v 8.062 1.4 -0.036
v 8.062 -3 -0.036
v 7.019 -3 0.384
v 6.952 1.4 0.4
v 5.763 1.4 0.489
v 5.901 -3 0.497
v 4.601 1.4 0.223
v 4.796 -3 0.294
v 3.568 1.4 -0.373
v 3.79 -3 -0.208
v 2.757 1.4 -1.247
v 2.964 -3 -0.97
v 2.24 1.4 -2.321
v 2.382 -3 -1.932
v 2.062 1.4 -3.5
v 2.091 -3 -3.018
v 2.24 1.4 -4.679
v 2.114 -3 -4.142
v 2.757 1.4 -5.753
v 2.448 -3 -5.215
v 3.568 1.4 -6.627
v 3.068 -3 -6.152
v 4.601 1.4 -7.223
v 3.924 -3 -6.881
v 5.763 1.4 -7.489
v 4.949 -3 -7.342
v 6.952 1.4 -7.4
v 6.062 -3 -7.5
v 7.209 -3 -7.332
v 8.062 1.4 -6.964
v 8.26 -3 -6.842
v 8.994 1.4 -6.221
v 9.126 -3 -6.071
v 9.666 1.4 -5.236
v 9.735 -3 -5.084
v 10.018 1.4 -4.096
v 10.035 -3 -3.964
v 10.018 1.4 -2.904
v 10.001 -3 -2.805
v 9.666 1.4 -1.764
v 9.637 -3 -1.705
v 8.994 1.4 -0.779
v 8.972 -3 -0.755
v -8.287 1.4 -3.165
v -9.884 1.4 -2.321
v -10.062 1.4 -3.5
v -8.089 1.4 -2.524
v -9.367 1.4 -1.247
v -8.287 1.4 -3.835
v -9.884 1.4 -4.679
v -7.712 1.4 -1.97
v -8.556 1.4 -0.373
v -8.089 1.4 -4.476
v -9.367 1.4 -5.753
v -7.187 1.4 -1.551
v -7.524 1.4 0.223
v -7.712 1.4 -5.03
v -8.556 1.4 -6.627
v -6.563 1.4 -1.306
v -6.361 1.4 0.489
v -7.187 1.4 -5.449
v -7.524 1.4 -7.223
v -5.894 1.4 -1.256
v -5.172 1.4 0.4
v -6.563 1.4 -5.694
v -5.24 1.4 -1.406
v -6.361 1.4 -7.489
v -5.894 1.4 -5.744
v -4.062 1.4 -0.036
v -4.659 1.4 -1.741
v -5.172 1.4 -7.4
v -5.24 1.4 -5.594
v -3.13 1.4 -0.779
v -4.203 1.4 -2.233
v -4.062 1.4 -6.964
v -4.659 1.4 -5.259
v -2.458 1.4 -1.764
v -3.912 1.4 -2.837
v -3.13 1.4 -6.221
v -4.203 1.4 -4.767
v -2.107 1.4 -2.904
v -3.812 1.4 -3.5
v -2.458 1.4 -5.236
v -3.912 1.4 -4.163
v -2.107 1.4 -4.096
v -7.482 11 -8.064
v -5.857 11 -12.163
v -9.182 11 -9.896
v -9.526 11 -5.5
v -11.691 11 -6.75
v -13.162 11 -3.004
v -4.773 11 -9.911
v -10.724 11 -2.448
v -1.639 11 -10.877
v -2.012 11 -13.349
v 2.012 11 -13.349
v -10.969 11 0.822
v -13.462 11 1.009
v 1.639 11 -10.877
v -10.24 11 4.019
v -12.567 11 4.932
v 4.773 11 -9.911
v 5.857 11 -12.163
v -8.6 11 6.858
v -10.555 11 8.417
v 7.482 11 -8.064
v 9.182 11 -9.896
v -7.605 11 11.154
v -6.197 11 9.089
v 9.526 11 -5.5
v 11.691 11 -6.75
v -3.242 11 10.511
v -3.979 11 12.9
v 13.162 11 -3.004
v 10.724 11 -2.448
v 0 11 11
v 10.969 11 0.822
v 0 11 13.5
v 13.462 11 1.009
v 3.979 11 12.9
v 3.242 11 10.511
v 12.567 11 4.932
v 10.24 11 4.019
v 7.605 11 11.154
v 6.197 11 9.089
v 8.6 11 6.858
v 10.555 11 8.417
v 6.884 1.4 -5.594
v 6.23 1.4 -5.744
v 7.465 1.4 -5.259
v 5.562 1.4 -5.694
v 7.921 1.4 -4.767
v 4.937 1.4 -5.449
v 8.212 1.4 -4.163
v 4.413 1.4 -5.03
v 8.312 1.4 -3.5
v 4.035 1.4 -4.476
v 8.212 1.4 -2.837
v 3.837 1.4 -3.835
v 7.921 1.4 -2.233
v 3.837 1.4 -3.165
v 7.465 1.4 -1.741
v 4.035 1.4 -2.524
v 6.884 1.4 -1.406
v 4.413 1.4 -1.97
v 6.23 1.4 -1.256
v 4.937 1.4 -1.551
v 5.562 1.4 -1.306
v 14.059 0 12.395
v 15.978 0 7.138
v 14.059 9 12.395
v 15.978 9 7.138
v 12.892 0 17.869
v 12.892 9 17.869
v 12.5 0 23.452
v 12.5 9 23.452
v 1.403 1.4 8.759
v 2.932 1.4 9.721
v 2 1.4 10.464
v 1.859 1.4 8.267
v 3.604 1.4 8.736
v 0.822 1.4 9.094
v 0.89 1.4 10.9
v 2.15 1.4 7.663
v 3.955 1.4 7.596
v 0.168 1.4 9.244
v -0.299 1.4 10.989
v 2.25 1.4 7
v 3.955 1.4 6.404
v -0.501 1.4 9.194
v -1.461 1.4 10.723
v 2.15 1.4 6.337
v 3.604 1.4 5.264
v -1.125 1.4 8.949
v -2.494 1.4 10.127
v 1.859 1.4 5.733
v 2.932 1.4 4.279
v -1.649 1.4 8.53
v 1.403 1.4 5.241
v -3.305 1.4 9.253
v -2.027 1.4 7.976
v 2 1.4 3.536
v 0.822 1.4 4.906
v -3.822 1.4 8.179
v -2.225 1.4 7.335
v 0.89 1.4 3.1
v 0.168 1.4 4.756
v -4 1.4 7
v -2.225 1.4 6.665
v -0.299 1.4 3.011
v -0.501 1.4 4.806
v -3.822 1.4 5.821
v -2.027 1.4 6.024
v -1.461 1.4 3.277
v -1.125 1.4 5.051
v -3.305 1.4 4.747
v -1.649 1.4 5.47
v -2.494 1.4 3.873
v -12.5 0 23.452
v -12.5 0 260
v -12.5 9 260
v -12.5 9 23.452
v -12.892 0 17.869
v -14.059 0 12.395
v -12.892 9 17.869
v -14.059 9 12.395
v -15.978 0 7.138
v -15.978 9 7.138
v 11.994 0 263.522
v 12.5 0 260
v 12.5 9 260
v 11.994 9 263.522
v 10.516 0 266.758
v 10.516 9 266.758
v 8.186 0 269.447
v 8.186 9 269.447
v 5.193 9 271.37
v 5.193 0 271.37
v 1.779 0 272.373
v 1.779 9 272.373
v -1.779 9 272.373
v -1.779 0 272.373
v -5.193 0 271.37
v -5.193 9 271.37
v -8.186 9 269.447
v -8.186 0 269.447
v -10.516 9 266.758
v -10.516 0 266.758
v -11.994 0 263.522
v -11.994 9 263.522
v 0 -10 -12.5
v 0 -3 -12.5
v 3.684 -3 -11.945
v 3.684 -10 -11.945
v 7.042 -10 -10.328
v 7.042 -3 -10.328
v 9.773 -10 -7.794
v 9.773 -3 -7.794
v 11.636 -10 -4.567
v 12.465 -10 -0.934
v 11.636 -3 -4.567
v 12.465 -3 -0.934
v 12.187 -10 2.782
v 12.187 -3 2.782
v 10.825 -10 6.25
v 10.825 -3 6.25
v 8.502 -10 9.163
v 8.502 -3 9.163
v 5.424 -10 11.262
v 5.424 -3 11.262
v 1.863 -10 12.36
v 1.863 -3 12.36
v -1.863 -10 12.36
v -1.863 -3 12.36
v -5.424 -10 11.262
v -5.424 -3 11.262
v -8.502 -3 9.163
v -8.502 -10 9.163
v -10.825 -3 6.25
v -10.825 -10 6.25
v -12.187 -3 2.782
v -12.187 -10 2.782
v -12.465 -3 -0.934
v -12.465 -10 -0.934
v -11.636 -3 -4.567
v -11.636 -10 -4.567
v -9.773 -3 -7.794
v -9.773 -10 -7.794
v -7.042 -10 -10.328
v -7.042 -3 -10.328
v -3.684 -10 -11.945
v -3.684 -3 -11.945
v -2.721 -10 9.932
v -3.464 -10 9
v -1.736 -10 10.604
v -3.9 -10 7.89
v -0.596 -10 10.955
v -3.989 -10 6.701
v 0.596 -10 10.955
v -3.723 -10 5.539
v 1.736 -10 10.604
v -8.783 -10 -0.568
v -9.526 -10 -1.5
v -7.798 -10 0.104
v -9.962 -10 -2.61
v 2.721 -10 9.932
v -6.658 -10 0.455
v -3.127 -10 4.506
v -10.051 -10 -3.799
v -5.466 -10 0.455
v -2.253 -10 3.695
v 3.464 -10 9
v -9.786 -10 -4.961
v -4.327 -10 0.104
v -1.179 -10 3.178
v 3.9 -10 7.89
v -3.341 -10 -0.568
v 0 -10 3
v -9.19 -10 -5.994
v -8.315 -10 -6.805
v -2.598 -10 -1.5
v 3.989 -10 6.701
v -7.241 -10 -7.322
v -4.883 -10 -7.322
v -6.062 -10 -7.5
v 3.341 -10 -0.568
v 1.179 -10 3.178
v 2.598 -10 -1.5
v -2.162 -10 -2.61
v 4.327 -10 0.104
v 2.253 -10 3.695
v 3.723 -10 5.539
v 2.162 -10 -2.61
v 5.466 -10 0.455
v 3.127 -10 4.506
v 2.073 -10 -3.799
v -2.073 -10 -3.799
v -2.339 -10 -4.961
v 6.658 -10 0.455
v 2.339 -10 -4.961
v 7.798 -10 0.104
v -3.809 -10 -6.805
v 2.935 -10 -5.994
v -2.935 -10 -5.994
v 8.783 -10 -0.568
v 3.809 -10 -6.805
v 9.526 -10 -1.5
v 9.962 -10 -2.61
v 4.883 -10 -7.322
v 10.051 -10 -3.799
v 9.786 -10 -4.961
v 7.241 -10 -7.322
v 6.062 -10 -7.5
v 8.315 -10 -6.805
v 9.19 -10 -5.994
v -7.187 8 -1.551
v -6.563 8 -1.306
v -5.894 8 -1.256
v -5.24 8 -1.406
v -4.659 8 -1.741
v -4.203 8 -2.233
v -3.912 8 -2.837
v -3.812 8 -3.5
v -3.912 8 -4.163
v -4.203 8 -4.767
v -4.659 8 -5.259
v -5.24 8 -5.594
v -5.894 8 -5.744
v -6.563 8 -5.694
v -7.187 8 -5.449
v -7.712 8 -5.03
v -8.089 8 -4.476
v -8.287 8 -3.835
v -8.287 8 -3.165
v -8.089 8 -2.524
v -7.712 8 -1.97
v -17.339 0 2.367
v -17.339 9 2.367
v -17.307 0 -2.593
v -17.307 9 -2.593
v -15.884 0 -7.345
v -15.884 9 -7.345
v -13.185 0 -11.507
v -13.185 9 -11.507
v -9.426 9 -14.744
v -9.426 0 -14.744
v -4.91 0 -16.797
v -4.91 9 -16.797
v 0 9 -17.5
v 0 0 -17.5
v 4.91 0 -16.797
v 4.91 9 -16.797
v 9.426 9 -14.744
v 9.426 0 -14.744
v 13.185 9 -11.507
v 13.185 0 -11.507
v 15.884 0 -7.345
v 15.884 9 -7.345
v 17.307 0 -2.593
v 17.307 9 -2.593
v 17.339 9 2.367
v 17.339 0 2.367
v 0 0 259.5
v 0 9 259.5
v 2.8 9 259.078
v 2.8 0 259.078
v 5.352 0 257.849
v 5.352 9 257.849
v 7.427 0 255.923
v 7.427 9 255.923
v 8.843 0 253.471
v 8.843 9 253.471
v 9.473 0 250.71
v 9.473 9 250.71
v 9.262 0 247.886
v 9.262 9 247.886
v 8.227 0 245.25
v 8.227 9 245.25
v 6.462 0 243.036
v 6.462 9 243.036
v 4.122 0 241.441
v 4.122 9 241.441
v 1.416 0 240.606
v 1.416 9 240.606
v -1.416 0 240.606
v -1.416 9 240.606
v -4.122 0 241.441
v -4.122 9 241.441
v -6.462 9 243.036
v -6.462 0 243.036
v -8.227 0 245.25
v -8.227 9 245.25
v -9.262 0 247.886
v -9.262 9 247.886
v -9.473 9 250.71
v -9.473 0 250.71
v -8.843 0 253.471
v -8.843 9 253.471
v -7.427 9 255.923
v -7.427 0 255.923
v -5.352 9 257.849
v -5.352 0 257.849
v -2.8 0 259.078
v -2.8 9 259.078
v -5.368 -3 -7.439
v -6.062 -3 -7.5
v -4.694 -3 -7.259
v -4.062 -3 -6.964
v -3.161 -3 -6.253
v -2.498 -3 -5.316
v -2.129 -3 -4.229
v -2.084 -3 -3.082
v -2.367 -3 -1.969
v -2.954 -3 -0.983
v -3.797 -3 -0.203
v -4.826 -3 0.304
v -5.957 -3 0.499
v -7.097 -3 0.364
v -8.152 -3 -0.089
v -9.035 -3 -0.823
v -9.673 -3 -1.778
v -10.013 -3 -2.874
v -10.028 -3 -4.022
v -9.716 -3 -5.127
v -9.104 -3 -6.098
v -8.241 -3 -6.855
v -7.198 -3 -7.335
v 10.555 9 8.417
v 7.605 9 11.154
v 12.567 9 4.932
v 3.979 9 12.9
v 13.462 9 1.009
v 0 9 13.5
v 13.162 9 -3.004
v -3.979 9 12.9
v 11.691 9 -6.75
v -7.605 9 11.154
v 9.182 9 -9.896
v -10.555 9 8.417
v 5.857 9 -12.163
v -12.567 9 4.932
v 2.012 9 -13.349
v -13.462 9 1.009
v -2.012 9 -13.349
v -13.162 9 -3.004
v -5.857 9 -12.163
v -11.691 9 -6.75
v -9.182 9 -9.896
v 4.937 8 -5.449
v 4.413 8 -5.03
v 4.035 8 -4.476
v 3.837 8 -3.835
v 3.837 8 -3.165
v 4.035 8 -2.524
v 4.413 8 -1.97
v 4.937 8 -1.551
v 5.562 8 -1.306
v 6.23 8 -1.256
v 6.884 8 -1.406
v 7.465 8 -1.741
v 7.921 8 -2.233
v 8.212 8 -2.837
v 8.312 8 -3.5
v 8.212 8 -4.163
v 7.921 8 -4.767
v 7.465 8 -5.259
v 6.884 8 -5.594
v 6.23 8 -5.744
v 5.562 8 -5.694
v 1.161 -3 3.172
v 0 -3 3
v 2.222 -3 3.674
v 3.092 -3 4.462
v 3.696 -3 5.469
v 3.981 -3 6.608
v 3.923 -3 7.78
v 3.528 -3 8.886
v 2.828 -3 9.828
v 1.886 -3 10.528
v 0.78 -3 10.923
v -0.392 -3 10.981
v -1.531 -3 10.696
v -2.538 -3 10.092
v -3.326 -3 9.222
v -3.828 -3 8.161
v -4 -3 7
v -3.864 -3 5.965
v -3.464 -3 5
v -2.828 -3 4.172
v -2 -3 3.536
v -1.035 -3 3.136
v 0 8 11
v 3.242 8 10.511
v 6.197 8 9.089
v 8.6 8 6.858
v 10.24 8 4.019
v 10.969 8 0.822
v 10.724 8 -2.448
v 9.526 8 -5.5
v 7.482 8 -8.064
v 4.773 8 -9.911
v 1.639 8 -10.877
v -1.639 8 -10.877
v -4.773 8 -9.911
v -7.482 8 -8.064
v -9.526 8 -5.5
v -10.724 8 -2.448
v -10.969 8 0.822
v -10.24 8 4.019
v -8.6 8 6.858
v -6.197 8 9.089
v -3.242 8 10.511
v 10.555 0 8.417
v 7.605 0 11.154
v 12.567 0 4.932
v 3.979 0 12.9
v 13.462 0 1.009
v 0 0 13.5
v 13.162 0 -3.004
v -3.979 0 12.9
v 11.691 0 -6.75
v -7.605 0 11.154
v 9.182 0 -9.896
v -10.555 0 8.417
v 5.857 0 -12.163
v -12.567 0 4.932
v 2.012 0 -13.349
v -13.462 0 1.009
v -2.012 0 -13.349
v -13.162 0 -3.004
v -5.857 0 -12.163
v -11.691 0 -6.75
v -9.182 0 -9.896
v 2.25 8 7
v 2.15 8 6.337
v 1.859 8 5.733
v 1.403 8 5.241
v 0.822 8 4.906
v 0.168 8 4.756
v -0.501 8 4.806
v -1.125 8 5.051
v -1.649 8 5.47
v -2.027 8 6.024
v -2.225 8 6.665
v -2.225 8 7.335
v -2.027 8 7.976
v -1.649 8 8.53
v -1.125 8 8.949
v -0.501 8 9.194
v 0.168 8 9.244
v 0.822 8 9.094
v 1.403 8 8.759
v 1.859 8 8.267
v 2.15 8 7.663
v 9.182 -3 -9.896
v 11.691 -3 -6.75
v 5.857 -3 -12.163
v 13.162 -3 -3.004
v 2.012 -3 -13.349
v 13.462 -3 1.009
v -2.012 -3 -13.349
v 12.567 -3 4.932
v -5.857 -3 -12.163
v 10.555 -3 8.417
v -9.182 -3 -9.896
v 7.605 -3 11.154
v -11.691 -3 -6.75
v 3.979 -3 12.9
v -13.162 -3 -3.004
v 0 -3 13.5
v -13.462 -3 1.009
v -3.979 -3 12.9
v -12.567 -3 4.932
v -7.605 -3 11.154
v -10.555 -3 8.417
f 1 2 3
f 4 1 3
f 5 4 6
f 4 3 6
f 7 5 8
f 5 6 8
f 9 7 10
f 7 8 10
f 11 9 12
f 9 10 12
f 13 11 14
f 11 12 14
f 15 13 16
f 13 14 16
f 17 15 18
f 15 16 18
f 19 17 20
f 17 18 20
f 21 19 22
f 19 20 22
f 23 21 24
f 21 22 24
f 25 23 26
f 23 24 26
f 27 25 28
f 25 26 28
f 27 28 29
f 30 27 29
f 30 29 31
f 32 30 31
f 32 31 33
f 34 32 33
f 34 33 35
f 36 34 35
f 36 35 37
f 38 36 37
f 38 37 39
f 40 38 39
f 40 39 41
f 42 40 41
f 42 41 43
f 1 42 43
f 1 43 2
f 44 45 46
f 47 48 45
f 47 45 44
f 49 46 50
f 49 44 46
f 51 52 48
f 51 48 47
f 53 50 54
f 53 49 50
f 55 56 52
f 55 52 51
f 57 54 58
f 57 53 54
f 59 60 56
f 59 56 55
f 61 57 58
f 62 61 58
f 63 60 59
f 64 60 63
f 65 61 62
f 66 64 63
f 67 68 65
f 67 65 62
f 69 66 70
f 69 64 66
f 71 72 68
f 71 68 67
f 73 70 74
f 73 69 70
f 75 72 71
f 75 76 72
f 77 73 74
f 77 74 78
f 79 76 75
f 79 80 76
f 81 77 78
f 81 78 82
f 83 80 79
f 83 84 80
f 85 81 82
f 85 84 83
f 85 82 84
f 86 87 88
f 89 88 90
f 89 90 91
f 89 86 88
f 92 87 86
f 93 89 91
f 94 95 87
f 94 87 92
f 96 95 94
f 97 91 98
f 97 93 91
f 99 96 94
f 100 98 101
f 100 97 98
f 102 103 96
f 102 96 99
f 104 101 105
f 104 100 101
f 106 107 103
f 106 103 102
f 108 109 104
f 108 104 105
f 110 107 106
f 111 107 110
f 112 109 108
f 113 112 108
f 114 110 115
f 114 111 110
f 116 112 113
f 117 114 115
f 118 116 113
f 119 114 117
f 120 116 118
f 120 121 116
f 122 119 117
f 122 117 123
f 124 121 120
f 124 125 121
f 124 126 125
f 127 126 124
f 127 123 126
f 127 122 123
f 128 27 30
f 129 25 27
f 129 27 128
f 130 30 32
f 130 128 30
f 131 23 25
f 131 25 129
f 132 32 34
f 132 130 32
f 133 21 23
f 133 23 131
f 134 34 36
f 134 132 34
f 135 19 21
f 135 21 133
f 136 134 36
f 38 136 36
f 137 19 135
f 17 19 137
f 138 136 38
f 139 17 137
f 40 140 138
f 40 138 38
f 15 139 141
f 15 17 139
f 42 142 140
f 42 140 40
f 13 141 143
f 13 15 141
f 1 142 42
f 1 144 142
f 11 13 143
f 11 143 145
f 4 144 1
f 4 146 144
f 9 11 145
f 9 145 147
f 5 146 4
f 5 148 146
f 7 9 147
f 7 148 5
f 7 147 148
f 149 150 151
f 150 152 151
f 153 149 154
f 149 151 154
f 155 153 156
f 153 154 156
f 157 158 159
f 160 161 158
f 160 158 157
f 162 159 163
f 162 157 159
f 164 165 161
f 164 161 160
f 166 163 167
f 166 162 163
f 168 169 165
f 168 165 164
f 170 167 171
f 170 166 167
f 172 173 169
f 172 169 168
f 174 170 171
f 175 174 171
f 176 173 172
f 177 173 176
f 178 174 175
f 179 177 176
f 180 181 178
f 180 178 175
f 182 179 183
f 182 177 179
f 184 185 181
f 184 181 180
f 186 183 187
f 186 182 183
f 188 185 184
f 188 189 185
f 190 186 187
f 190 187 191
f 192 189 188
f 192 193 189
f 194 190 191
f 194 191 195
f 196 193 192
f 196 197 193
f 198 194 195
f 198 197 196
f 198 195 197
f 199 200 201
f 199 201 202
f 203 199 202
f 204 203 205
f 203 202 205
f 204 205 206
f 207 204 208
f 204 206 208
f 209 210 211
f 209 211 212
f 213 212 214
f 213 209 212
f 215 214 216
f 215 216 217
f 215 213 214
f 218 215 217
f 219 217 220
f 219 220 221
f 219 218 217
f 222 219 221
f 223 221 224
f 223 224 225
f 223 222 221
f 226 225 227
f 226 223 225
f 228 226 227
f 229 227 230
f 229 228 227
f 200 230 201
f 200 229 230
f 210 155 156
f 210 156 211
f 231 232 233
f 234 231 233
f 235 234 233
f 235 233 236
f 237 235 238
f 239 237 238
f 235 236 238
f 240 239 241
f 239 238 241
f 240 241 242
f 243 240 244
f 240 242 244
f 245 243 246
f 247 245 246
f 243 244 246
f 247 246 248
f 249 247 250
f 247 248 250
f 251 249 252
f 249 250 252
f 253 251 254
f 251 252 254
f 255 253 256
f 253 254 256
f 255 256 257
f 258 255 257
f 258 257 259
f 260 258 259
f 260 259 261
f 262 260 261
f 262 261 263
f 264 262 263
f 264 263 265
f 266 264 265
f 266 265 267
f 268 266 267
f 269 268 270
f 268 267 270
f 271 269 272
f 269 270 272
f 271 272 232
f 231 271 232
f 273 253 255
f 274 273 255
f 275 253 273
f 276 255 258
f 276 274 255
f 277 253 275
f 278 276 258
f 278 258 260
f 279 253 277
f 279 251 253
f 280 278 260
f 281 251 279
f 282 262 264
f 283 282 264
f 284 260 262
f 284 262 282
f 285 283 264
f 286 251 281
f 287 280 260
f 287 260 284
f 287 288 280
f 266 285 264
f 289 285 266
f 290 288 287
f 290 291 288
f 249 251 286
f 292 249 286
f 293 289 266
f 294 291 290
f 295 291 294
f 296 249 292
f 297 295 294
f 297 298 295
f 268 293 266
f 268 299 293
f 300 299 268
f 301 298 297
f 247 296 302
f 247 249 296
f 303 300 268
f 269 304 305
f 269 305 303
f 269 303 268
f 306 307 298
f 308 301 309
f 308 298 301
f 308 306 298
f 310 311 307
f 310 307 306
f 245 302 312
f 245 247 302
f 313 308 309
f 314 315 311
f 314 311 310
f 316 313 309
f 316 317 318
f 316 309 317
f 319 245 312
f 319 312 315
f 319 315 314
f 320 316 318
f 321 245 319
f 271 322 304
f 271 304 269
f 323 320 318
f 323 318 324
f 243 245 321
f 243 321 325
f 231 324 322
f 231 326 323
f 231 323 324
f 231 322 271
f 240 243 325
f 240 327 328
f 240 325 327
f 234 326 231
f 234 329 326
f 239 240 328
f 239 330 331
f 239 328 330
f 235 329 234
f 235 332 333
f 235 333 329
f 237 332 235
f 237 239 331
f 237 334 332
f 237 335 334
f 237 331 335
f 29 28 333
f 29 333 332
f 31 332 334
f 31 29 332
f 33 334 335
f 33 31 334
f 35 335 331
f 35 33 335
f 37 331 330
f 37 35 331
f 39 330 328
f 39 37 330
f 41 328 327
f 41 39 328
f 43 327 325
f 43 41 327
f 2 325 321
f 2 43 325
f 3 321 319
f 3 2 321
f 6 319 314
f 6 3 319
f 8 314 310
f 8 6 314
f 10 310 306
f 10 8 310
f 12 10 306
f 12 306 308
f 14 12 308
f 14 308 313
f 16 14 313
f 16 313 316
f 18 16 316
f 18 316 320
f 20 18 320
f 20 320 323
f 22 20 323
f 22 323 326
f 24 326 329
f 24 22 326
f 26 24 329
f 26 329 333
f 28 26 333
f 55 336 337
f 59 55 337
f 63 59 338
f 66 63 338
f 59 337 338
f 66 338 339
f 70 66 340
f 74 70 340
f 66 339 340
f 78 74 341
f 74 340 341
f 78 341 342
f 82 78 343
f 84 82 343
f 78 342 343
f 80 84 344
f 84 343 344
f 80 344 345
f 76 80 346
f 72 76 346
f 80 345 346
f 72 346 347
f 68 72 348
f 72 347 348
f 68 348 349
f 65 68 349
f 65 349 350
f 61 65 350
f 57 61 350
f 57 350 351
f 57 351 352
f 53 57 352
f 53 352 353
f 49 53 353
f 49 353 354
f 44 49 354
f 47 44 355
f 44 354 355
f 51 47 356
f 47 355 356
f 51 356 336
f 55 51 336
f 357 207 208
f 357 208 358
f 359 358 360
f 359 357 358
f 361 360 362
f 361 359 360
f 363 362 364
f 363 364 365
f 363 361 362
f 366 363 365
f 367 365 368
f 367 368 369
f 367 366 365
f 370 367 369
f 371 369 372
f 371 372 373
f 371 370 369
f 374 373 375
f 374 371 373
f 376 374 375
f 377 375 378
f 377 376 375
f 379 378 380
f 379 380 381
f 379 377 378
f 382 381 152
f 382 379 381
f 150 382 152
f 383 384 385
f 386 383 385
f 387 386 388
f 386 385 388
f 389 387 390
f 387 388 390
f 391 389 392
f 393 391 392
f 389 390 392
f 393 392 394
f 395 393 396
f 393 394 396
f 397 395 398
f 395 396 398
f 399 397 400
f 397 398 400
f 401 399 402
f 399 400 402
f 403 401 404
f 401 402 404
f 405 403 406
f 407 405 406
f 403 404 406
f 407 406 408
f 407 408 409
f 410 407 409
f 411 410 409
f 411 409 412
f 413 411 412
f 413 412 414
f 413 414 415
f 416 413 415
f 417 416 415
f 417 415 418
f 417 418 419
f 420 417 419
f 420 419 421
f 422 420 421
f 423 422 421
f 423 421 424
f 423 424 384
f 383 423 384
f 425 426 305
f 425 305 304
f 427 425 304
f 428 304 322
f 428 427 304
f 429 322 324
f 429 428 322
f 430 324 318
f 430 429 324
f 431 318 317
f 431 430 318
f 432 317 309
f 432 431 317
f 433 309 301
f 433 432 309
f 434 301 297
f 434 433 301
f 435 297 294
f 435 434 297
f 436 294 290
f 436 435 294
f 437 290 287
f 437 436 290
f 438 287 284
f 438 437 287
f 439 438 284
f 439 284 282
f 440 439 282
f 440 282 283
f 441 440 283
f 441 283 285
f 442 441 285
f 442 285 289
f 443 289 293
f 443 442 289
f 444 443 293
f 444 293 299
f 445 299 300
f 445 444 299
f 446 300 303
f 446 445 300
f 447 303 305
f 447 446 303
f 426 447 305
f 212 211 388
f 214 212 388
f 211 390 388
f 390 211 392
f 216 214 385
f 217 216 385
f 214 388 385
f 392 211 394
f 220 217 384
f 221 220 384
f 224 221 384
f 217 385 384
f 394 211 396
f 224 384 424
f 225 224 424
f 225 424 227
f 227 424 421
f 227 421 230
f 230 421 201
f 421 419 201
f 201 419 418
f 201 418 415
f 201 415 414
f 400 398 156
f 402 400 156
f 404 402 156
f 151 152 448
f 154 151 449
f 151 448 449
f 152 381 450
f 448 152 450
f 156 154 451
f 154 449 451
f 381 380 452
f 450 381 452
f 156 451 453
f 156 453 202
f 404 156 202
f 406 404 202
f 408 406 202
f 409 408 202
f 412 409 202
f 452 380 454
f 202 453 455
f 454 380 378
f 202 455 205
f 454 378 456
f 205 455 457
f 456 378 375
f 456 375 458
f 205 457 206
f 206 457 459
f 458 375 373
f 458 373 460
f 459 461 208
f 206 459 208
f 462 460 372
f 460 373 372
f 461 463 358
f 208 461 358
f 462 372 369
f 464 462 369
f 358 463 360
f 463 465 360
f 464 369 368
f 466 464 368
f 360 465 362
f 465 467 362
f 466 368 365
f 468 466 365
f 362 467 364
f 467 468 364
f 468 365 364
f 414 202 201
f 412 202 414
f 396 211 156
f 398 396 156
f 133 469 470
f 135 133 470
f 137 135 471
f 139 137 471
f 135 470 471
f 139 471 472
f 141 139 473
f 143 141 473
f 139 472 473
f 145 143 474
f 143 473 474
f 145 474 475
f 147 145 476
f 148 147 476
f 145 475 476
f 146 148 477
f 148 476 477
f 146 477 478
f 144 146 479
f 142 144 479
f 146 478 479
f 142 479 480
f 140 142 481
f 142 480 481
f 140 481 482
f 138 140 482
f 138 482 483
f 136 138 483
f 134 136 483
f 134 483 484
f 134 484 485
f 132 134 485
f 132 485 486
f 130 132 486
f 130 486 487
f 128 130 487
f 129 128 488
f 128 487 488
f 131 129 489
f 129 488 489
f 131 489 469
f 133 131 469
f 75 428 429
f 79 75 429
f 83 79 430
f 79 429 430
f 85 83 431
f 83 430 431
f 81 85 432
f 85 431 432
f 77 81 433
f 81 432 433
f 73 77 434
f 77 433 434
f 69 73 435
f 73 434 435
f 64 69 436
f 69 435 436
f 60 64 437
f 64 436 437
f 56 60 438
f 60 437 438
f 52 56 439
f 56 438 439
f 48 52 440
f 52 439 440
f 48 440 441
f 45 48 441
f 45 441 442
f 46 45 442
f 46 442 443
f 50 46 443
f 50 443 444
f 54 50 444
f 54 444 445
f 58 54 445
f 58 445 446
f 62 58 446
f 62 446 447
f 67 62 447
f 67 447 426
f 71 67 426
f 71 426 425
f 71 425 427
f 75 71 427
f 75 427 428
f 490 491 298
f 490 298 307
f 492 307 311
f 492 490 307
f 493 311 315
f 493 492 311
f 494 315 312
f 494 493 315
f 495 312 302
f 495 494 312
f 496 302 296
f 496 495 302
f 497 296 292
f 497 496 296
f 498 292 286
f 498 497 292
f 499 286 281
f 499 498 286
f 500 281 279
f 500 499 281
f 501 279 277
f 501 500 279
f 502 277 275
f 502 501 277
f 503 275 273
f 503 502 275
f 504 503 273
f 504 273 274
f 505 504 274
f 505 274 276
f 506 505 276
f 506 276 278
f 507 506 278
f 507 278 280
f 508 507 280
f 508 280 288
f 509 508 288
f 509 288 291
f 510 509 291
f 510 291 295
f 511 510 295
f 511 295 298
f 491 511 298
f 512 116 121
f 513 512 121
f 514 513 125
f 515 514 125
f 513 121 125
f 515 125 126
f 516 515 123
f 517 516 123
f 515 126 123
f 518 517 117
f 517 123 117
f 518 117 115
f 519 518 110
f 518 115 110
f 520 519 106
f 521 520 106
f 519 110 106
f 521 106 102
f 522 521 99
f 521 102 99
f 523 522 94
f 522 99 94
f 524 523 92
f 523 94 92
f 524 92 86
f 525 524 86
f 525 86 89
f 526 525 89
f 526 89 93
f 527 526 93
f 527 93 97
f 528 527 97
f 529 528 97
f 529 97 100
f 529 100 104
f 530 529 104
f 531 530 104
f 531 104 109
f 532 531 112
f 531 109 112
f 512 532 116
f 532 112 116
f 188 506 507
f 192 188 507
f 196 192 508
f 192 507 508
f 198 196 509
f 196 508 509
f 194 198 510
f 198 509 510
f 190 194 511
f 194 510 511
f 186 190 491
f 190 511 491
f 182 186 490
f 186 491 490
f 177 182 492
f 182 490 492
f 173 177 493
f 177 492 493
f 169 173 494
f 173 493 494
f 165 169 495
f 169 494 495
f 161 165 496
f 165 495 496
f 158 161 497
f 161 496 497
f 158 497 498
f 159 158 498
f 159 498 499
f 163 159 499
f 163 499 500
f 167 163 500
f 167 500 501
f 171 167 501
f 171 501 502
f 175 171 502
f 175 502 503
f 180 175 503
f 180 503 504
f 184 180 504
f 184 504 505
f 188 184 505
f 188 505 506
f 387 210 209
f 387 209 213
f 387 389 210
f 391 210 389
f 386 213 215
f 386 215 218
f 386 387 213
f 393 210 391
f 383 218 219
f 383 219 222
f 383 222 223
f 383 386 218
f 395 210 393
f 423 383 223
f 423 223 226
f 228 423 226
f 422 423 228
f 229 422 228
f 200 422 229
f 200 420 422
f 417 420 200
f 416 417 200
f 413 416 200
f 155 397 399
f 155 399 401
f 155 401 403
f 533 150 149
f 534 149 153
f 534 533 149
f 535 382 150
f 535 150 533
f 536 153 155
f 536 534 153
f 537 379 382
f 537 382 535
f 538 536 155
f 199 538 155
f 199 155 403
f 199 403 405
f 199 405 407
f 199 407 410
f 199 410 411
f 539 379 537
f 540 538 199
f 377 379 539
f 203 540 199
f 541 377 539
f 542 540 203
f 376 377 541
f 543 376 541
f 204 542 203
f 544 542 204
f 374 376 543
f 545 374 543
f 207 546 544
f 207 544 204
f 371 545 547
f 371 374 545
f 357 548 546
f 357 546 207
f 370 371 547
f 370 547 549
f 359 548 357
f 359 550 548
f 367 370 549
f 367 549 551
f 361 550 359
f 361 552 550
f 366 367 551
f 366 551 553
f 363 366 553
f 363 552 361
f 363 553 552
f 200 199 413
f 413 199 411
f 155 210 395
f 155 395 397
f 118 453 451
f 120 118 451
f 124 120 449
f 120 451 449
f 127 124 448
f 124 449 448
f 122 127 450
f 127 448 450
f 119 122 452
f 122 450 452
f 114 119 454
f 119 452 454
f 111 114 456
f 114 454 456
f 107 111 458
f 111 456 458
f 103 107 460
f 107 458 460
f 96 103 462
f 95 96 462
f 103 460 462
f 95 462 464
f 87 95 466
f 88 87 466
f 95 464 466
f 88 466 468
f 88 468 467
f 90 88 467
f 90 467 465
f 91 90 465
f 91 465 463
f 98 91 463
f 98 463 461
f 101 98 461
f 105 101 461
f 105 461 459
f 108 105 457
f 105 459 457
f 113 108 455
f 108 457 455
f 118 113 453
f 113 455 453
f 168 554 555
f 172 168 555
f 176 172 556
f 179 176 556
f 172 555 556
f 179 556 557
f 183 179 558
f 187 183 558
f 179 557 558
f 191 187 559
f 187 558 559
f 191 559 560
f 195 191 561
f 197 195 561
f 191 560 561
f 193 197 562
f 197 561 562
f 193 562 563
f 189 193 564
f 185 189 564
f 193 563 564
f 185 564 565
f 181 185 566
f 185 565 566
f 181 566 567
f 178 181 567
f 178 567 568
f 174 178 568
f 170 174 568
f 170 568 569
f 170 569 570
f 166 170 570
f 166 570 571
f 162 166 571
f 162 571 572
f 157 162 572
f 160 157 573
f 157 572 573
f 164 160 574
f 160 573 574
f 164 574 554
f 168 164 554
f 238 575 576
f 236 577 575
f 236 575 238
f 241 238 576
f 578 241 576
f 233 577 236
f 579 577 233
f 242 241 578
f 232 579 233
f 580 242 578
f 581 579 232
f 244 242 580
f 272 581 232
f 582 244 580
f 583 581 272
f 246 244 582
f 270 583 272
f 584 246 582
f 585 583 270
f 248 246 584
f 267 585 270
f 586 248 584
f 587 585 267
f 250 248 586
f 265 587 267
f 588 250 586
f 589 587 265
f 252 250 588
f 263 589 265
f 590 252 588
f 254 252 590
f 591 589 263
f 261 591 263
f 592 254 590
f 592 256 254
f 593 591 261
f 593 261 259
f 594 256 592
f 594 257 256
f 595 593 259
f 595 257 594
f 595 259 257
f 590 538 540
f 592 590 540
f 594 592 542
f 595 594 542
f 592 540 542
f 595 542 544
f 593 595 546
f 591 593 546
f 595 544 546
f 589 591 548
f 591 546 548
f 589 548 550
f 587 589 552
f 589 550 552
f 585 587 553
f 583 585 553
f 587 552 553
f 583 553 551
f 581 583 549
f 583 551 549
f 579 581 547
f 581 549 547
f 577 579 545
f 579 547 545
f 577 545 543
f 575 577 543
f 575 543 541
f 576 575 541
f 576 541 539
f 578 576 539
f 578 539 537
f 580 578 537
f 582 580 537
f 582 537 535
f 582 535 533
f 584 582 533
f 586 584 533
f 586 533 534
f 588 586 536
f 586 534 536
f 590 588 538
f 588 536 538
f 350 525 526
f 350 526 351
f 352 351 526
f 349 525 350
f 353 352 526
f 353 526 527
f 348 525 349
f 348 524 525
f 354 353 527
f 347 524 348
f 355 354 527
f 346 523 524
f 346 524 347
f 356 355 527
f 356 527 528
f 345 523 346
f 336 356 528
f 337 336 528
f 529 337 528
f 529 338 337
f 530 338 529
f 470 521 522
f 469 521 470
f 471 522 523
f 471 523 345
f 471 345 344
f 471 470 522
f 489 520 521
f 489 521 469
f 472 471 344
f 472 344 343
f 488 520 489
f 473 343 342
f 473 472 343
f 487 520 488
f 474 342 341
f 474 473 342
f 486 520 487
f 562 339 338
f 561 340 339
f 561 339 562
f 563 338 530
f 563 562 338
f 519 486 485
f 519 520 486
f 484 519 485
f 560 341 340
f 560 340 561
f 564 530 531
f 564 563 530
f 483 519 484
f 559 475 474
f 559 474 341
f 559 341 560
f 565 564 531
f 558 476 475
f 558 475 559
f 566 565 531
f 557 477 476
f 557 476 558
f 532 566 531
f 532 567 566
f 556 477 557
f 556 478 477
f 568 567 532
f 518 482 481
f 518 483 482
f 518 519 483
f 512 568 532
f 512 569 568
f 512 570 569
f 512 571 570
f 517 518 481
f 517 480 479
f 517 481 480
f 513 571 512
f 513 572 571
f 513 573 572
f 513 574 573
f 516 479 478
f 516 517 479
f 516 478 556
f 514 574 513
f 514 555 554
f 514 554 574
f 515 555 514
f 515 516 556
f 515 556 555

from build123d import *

# Parameters (mm, degrees)
EXTRUDE_1_DEPTH              = 9
SKETCH_3_R                   = 13.5
EXTRUDE_2_DEPTH              = 2
EXTRUDE_START                = 3
SKETCH_4_R                   = 13.5
EXTRUDE_3_DEPTH              = 3
SKETCH_5_R                   = 9.5
CUT_EXTRUDE_2_DEPTH          = 274.324898244
HOLE_WIZARD_M4_1_D           = 4.5
HOLE_WIZARD_M4_1_CBORE_D     = 8
HOLE_WIZARD_M4_1_CBORE_DEPTH = 4.4
PATTERN_CIRCULAR_1_COUNT     = 3
EXTRUDE_START_2              = 7
SKETCH_11_R                  = 12.5
SKETCH_11_R_2                = 4
EXTRUDE_4_DEPTH              = 7
SKETCH_13_R                  = 11
CUT_EXTRUDE_3_DEPTH          = 3
FILLET_1_R                   = 40


with BuildPart() as part:
    # 스케치1 → 보스-돌출1 (new body)
    with BuildSketch(Plane(origin=(0, 0, 0), x_dir=(1, 0, 0), z_dir=(0, 1, 0))):
        with BuildLine():
            Line((-12.5, -260), (-12.5, -12.247448714))
            ThreePointArc((-12.5, -12.247448714), (0, 17.5), (12.5, -12.247448714))
            Line((12.5, -12.247448714), (12.5, -260))
            ThreePointArc((12.5, -260), (0, -272.5), (-12.5, -260))
        make_face()
    extrude(amount=EXTRUDE_1_DEPTH)

    # 스케치3 → 보스-돌출2 (add)
    with BuildSketch(Plane(origin=(0, 9, 0), x_dir=(1, 0, 0), z_dir=(0, 1, 0))):
        Circle(SKETCH_3_R)
    extrude(amount=EXTRUDE_2_DEPTH)

    # 스케치4 → 보스-돌출3 (add)
    with BuildSketch(Plane.XZ.offset(EXTRUDE_START)):
        Circle(SKETCH_4_R)
    extrude(amount=-EXTRUDE_3_DEPTH)

    # 스케치5 → 컷-돌출2 (cut, through all)
    with BuildSketch(Plane(origin=(0, 9, 0), x_dir=(1, 0, 0), z_dir=(0, 1, 0))):
        with Locations((0, -250)):
            Circle(SKETCH_5_R)
    extrude(amount=-CUT_EXTRUDE_2_DEPTH, mode=Mode.SUBTRACT)

    # M4 육각 소켓 머리 캡 나사용 카운터보어1 (through all)
    with Locations(Plane(origin=(0, -3, 0), x_dir=(-1, 0, 0), z_dir=(0, -1, 0))):
        with Locations((0, -7)):
            hole_wizard_m4_1 = CounterBoreHole(HOLE_WIZARD_M4_1_D / 2, HOLE_WIZARD_M4_1_CBORE_D / 2, HOLE_WIZARD_M4_1_CBORE_DEPTH)

    # 원형 패턴1: M4 육각 소켓 머리 캡 나사용 카운터보어1 ×3 about axis
    pattern_circular_1_axis = Axis((0, 9, 0), (0, -1, 0))
    for i in range(1, PATTERN_CIRCULAR_1_COUNT):
        add(hole_wizard_m4_1.rotate(pattern_circular_1_axis, i * 360 / PATTERN_CIRCULAR_1_COUNT), mode=Mode.SUBTRACT)

    # 스케치11 → 보스-돌출4 (add)
    with BuildSketch(Plane.XZ.offset(3).offset(EXTRUDE_START_2)):
        Circle(SKETCH_11_R)
        with Locations((-6.062177826, -3.5)):
            Circle(SKETCH_11_R_2, mode=Mode.SUBTRACT)
        with Locations((6.062177826, -3.5)):
            Circle(SKETCH_11_R_2, mode=Mode.SUBTRACT)
        with Locations((0, 7)):
            Circle(SKETCH_11_R_2, mode=Mode.SUBTRACT)
    extrude(amount=-EXTRUDE_4_DEPTH)

    # 스케치13 → 컷-돌출3 (cut)
    with BuildSketch(Plane(origin=(0, 11, 0), x_dir=(1, 0, 0), z_dir=(0, 1, 0))):
        Circle(SKETCH_13_R)
    extrude(amount=-CUT_EXTRUDE_3_DEPTH, mode=Mode.SUBTRACT)

    # 필렛1
    fillet_1_edges = [part.edges().sort_by_distance(p)[0] for p in [
        (12.5, 4.5, 12.247448714),
        (-12.5, 4.5, 12.247448714),
    ]]
    fillet(fillet_1_edges, radius=FILLET_1_R)


solid = part.part
